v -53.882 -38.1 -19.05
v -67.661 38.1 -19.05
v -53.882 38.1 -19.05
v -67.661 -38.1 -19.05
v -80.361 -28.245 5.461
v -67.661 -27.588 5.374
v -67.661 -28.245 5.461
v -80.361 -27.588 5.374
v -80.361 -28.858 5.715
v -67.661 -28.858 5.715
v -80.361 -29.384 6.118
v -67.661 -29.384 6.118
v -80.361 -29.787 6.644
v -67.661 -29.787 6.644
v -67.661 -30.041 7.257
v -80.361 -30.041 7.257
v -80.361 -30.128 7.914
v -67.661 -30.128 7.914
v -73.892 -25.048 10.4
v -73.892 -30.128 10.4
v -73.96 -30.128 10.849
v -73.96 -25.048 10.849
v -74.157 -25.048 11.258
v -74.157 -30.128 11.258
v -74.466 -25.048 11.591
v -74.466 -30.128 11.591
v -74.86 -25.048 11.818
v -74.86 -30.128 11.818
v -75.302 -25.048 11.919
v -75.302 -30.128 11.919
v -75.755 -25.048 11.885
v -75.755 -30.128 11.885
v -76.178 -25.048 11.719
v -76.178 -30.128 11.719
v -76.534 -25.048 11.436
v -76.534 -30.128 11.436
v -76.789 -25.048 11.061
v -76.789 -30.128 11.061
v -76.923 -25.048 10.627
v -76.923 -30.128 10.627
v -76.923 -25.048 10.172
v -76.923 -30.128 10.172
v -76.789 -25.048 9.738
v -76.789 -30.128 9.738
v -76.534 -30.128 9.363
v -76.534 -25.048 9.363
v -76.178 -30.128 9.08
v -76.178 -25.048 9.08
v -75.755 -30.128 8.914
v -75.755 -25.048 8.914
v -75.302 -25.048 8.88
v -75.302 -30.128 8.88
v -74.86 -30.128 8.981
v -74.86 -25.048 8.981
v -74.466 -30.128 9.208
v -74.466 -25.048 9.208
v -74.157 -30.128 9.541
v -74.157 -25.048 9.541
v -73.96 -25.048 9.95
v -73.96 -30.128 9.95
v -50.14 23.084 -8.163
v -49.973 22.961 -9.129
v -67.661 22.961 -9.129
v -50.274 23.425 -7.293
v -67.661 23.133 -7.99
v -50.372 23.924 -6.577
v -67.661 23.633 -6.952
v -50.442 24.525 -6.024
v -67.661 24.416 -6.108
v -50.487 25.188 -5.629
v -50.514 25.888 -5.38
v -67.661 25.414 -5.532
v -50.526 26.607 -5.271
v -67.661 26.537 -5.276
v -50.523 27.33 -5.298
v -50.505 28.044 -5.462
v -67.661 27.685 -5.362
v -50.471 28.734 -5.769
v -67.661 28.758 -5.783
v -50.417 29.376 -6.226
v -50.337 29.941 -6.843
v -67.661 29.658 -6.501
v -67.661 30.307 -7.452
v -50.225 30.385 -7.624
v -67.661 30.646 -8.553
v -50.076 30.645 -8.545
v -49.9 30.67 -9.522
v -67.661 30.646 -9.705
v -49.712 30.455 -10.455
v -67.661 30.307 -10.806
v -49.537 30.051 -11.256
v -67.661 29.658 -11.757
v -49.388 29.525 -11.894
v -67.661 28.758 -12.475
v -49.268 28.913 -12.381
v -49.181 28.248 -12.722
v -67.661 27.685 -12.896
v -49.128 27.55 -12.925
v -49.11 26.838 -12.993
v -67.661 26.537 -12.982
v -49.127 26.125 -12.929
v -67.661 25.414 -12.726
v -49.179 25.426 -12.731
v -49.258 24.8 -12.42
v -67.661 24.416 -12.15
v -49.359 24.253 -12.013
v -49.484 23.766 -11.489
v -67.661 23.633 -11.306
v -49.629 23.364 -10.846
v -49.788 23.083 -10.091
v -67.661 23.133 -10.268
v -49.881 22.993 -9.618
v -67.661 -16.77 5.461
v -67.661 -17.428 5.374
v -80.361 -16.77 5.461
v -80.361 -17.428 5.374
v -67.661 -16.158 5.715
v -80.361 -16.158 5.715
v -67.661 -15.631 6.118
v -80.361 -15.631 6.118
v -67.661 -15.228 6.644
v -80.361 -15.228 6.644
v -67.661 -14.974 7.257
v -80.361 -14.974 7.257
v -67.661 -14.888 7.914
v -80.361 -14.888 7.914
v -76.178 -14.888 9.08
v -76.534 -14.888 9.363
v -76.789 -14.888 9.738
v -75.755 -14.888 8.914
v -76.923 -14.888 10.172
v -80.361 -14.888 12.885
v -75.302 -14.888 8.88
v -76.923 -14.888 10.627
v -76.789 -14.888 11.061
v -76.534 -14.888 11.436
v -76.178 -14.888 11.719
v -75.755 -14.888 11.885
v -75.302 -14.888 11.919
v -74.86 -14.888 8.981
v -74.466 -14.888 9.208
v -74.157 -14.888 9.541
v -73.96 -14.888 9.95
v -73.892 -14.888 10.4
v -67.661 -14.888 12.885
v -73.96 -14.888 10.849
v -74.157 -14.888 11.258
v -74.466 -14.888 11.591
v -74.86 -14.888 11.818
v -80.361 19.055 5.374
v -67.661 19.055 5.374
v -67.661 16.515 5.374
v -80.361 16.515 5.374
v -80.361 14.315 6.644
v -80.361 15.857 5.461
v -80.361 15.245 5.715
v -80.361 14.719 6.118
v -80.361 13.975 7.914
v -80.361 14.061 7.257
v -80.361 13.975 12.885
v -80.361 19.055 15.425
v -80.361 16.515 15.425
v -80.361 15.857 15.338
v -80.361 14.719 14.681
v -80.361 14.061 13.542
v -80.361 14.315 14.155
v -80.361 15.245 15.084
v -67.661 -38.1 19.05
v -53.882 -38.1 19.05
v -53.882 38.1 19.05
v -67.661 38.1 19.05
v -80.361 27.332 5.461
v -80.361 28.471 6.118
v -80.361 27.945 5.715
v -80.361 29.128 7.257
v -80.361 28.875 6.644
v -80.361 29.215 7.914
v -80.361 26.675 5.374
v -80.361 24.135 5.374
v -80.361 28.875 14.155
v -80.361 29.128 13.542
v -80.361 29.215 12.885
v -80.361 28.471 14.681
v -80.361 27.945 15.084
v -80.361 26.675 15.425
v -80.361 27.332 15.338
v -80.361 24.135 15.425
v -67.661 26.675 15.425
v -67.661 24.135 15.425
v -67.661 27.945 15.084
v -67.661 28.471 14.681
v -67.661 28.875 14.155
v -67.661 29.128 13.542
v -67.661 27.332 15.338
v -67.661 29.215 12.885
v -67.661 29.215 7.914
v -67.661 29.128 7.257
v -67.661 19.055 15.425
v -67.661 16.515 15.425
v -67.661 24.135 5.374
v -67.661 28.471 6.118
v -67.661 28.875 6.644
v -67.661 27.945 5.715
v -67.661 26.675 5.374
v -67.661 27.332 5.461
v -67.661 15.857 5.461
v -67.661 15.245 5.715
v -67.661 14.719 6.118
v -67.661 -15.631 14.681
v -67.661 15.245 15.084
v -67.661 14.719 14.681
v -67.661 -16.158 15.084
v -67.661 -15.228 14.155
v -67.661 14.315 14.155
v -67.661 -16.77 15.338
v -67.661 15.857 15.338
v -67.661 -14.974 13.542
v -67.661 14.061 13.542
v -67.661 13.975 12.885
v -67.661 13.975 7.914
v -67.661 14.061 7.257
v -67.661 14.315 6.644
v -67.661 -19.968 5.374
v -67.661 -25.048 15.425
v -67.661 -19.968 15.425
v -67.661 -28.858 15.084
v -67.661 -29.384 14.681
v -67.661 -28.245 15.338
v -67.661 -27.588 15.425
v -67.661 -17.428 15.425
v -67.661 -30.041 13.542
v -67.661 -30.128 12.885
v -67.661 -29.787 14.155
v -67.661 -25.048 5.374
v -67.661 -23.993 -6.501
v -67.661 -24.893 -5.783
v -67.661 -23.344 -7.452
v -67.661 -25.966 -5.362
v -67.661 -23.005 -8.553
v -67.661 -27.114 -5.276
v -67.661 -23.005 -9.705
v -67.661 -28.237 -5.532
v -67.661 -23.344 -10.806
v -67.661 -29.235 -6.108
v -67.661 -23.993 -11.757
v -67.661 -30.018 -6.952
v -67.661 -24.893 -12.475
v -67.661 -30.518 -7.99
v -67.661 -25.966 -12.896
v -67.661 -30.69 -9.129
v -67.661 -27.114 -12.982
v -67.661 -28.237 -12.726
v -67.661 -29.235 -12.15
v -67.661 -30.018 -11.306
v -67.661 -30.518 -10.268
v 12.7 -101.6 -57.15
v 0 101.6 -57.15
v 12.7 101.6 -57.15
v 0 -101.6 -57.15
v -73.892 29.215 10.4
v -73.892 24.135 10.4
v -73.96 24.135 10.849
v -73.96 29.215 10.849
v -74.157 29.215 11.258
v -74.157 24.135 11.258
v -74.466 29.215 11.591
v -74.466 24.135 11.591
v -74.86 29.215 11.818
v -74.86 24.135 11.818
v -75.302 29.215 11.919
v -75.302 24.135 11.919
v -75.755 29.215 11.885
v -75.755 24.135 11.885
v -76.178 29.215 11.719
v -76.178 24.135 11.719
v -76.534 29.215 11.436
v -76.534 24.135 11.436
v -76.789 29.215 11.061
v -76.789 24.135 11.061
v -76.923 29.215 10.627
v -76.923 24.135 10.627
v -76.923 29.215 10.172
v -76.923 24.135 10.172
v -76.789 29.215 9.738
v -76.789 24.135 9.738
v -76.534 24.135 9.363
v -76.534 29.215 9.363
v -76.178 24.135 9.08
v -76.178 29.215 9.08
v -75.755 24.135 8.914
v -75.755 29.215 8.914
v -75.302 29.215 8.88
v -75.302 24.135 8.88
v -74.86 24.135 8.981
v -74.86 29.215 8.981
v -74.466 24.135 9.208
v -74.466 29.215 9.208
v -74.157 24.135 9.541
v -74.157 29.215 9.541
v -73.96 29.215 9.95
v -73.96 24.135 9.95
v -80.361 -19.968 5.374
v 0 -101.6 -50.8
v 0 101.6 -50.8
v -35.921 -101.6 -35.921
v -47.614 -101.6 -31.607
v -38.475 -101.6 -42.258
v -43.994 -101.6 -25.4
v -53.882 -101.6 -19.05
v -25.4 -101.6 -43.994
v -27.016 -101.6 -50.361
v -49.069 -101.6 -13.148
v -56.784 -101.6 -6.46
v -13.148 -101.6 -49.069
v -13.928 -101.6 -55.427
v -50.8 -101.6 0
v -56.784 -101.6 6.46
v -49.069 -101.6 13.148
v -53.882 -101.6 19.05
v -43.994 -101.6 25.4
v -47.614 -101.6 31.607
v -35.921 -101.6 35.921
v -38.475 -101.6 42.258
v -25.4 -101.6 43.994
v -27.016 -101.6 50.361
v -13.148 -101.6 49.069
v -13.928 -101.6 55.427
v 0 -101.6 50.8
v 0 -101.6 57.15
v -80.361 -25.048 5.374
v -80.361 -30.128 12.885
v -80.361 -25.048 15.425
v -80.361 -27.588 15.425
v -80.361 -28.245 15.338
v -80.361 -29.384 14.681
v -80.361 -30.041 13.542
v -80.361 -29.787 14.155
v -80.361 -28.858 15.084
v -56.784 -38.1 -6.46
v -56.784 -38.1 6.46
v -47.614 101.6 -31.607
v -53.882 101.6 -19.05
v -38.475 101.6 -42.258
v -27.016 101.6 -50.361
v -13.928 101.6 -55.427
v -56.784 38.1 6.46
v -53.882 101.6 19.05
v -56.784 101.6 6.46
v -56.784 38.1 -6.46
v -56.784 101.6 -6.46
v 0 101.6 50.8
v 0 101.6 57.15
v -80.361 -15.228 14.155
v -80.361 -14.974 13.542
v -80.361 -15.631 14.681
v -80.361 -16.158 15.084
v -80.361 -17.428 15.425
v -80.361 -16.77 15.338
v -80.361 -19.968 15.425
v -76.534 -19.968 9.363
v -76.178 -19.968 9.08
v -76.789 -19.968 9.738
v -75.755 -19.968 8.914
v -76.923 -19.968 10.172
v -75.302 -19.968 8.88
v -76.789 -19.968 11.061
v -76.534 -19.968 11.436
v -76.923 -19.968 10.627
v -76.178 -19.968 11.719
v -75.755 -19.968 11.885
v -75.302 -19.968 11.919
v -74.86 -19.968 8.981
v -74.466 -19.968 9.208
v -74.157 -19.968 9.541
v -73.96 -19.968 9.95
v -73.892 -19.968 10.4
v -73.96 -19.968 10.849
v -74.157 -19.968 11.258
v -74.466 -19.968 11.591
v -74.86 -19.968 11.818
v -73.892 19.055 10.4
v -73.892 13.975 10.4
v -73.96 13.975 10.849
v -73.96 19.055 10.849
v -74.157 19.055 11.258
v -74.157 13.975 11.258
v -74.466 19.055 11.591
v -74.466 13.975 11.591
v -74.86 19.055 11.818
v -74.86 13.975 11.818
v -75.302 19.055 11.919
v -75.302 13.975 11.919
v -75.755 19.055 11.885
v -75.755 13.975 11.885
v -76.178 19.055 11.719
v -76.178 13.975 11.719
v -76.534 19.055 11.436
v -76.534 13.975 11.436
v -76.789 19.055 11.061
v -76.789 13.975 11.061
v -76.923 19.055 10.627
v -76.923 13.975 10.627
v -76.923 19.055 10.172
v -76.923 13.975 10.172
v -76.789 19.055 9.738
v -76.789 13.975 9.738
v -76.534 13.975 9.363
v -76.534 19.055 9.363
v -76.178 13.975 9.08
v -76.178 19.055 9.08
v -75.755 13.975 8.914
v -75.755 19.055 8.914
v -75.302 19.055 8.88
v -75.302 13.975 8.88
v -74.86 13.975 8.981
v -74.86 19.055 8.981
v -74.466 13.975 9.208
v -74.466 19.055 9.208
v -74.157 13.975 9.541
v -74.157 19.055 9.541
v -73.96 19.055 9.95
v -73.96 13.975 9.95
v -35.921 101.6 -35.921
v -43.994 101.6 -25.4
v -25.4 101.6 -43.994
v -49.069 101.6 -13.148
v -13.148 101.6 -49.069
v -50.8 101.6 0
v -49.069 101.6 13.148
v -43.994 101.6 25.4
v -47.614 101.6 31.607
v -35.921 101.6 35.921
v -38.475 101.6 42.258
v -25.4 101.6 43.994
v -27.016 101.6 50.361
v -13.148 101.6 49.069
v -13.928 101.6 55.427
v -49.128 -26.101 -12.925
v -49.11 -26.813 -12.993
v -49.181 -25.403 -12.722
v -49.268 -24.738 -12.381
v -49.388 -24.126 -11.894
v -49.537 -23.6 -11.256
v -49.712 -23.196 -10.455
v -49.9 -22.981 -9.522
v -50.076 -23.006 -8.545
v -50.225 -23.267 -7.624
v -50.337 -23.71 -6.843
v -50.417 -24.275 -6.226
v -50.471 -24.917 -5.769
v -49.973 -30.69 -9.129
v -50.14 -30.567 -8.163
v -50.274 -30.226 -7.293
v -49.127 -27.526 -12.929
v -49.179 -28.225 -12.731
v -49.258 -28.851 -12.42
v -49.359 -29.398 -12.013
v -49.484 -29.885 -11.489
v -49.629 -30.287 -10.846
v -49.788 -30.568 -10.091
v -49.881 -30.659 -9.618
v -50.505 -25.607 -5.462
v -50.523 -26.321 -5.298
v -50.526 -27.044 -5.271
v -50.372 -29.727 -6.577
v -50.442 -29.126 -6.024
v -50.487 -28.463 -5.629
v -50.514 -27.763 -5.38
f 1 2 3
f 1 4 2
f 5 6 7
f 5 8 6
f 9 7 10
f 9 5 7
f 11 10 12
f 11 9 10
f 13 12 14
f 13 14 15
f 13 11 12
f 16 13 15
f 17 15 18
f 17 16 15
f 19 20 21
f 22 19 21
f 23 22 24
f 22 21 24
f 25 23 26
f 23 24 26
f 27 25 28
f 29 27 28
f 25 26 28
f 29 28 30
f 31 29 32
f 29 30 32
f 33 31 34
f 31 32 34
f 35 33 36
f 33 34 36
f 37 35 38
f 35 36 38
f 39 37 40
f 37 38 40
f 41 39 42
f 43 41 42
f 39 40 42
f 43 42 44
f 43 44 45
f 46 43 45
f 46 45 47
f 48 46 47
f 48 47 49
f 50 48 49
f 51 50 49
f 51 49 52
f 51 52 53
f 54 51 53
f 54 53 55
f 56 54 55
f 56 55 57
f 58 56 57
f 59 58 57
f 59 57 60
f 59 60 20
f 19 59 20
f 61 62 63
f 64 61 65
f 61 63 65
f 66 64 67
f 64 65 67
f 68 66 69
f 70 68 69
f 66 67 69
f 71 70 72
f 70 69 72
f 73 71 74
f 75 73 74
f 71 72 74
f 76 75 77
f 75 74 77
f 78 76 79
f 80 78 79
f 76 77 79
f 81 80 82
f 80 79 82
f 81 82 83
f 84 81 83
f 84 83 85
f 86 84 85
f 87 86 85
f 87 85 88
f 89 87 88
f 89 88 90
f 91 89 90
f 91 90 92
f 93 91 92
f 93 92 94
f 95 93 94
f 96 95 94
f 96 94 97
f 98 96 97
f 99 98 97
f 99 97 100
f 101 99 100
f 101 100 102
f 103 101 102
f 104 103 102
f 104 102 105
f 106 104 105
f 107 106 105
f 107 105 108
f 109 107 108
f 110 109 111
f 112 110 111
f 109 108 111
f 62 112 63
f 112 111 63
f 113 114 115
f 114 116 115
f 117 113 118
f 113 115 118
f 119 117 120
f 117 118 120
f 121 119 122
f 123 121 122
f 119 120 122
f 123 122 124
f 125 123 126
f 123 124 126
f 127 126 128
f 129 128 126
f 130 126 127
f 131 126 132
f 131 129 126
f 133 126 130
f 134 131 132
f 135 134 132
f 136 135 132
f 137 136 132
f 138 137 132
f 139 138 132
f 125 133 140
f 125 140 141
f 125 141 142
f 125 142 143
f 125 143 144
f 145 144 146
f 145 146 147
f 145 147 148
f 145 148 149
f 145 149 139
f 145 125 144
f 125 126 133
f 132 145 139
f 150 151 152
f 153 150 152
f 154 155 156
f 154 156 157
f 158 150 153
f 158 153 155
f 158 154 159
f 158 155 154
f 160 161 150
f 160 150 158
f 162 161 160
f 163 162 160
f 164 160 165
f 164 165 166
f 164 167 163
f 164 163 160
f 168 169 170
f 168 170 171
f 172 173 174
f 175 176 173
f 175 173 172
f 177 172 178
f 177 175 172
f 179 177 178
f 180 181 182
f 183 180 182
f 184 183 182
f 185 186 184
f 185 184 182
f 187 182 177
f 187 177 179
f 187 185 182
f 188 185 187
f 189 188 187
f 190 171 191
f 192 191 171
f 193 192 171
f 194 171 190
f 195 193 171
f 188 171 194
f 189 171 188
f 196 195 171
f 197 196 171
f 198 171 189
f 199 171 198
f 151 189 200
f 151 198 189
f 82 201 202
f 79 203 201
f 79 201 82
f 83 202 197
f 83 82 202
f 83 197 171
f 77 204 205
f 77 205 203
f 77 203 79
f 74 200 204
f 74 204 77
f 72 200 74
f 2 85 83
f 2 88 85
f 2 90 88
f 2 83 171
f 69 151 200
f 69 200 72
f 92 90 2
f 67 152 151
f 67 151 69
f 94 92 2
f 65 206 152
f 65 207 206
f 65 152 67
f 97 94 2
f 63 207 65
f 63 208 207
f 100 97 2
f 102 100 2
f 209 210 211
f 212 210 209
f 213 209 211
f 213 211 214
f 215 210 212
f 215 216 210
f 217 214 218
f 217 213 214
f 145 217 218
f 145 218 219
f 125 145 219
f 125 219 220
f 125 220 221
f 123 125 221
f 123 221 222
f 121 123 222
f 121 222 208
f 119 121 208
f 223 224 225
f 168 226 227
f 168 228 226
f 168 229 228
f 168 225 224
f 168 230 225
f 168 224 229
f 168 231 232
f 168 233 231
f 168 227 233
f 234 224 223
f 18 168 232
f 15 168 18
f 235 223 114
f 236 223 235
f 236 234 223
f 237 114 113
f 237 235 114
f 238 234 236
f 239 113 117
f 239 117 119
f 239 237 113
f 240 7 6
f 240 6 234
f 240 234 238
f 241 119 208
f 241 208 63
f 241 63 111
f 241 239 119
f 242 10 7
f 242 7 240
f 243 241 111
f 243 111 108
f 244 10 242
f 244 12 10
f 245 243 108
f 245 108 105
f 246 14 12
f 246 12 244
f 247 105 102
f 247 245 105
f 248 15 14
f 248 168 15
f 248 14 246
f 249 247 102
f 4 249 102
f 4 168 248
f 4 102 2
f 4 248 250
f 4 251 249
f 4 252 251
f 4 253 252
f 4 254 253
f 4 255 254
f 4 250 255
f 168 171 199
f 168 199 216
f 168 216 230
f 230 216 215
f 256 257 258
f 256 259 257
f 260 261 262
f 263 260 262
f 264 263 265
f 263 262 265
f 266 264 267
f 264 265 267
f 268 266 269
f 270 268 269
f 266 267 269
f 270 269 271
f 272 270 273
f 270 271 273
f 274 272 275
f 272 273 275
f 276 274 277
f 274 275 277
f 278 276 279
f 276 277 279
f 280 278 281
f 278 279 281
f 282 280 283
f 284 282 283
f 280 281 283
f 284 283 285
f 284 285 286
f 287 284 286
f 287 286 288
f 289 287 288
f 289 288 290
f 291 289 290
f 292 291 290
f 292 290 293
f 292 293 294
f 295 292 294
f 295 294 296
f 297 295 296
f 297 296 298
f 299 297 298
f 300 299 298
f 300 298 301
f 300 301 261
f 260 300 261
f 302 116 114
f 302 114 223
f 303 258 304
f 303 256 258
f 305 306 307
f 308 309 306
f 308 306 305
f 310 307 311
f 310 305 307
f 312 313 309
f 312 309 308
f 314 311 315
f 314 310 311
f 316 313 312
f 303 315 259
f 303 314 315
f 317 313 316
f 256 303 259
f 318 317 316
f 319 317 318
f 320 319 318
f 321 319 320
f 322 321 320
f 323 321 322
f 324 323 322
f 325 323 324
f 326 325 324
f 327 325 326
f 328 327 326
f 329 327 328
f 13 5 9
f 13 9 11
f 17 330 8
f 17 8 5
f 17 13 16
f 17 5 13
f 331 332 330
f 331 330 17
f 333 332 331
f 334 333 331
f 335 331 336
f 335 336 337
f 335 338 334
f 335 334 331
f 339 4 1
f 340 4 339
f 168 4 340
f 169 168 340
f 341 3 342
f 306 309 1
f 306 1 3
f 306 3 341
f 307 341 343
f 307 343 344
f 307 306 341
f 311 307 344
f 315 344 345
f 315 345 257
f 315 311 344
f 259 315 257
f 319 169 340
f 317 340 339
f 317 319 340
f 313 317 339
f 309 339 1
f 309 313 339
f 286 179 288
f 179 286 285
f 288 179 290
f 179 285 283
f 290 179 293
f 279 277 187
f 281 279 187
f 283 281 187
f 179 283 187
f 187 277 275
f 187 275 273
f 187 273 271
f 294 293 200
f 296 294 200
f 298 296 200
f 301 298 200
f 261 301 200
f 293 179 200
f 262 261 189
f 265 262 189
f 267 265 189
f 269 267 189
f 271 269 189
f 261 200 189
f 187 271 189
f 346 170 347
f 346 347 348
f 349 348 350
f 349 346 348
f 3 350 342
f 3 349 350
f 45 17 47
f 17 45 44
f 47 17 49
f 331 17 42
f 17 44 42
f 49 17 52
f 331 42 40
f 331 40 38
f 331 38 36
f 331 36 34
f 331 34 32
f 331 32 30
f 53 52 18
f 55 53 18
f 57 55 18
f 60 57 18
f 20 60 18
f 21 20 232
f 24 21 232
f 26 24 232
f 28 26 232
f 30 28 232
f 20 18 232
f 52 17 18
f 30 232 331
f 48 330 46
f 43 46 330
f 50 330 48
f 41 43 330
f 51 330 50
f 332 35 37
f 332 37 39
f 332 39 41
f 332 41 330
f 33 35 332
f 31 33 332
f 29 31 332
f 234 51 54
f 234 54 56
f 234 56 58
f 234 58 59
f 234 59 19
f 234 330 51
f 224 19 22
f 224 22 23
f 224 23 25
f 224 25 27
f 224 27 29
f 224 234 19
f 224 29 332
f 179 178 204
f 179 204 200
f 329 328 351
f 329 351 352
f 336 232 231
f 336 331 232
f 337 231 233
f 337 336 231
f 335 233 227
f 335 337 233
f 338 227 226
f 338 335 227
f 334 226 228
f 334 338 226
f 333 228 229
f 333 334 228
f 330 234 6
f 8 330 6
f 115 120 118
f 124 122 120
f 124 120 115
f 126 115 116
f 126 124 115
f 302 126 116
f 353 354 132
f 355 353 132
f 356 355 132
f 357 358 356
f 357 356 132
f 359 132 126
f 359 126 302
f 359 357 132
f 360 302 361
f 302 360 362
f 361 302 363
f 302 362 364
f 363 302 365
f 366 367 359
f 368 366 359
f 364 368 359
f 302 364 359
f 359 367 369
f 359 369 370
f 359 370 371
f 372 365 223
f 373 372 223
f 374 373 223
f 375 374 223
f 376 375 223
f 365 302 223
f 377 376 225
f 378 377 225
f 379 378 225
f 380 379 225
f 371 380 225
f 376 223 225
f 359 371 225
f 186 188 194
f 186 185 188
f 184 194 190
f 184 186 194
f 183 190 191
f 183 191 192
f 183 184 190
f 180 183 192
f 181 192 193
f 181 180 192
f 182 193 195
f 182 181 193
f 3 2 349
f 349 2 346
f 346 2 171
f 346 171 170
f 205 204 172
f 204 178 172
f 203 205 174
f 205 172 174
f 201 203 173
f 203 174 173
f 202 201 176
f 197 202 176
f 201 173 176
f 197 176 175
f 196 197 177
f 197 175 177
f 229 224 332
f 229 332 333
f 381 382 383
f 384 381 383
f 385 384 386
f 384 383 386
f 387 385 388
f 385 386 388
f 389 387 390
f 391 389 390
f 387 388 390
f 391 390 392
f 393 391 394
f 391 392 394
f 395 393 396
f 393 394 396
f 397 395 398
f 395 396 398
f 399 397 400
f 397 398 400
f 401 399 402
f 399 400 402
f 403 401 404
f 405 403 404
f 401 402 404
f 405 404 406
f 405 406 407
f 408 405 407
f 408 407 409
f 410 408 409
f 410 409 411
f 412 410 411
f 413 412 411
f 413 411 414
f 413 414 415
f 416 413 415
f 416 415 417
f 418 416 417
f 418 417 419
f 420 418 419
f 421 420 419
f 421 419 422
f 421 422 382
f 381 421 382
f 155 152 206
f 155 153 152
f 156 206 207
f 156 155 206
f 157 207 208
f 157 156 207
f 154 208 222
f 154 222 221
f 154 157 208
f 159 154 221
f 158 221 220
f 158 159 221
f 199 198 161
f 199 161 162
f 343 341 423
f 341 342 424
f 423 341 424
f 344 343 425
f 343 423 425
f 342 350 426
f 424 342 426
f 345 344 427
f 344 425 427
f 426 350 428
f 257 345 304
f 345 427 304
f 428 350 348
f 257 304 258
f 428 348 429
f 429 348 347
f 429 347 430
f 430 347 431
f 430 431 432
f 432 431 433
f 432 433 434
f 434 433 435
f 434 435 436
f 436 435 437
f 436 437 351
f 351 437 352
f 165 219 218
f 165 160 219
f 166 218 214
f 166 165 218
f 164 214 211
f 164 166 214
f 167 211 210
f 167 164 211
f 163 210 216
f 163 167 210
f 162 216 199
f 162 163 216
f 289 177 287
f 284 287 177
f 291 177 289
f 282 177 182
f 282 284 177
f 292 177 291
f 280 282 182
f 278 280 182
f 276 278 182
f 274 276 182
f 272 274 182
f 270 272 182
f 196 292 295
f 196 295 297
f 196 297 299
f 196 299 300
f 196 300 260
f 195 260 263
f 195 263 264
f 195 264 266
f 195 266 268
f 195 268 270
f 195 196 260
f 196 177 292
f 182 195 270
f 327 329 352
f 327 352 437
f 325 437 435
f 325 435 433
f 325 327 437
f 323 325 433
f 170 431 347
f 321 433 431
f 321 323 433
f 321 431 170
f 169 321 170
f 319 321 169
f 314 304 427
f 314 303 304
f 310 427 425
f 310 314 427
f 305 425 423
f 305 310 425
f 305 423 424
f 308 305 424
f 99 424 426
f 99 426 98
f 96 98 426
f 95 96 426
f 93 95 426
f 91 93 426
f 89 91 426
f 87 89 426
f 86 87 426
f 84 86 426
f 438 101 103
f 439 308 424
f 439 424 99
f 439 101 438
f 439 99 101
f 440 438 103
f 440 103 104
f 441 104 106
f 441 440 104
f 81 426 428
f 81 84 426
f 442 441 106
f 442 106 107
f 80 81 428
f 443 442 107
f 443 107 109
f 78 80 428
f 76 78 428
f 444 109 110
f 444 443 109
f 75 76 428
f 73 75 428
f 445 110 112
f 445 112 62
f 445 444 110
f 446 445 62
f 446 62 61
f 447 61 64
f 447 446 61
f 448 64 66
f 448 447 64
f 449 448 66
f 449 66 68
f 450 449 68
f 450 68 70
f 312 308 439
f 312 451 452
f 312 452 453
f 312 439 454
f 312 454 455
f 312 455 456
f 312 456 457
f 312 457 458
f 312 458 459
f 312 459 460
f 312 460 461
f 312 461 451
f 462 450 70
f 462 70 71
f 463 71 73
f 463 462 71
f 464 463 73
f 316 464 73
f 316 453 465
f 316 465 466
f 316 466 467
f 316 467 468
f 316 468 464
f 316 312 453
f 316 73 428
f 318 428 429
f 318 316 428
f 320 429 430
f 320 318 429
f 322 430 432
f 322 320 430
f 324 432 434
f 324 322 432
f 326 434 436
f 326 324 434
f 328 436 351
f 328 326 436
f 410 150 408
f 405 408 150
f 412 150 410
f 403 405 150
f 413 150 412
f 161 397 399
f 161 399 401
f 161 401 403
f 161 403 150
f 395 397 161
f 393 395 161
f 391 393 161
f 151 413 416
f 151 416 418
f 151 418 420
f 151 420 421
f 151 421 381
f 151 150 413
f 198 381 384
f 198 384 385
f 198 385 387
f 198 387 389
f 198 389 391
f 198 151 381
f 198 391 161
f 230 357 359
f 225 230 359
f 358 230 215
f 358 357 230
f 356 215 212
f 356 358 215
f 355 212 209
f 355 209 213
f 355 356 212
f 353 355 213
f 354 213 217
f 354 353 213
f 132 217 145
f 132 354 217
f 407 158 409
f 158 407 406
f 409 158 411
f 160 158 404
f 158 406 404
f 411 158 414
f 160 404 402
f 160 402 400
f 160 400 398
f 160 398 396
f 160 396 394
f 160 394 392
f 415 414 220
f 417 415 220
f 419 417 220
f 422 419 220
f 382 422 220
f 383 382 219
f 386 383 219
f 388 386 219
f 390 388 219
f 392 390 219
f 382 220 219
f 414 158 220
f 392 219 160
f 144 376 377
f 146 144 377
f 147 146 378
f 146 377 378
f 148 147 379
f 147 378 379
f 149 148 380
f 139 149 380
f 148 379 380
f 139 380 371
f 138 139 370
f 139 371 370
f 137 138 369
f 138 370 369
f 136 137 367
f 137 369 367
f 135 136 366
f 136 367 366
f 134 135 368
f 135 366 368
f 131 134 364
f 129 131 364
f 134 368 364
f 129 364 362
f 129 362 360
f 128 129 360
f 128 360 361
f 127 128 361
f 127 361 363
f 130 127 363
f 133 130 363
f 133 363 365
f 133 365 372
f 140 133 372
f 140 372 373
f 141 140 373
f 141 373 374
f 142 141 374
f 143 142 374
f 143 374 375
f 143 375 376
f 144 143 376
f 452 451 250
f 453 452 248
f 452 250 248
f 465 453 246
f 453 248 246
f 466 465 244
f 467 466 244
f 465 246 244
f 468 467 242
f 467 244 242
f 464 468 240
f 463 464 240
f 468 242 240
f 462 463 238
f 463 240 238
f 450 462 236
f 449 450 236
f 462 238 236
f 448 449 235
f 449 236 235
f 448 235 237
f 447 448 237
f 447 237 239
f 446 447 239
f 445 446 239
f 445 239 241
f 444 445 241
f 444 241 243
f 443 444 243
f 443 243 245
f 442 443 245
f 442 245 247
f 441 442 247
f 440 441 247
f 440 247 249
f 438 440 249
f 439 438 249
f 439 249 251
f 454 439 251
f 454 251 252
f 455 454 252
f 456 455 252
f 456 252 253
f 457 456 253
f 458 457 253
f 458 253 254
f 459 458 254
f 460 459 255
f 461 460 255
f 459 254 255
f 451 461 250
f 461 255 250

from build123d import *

# Parameters (mm, degrees)
F1_DEPTH = 101.6
F2_DEPTH = 38.1
F3_R     = 3.86409
F4_DEPTH = 25.4
F3_W     = 5.08
F3_H     = 10.050485
F5_DEPTH = 12.7
F6_R     = 2.54
F7_R     = 1.524
F8_DEPTH = 101.6


with BuildPart() as f1:
    # F0 (on Front) → F1 (new body, symmetric)
    with BuildSketch(Plane.XZ):
        with BuildLine():
            ThreePointArc((0, -50.8), (-50.8, 0), (0, 50.8))
            Line((0, 50.8), (0, 57.15))
            ThreePointArc((0, 57.15), (-32.995568, 46.66278), (-53.881537, 19.05))
            ThreePointArc((-53.881537, 19.05), (-57.15, 0), (-53.881537, -19.05))
            ThreePointArc((-53.881537, -19.05), (-32.995568, -46.66278), (0, -57.15))
            Line((0, -57.15), (12.7, -57.15))
            Line((12.7, -57.15), (0, -50.8))
        make_face()
    extrude(amount=F1_DEPTH, both=True)

    # F0 (on Front) → F2 (join, symmetric)
    with BuildSketch(Plane.XZ):
        with BuildLine():
            ThreePointArc((-53.881537, -19.05), (-57.15, 0), (-53.881537, 19.05))
            Line((-53.881537, 19.05), (-67.661227, 19.05))
            Line((-67.661227, 19.05), (-67.661227, -19.05))
            Line((-67.661227, -19.05), (-53.881537, -19.05))
        make_face()
    extrude(amount=F2_DEPTH, both=True)

    # F3 (on face) → F4 (cut)
    with BuildSketch(Plane(origin=(-67.661227, 0, 0), x_dir=(0, -1, 0), z_dir=(-1, 0, 0))):
        with Locations((-26.825511, -9.129036)):
            Circle(F3_R)
        with Locations((26.825511, -9.129036)):
            Circle(F3_R)
    extrude(amount=-F4_DEPTH, mode=Mode.SUBTRACT)

    # F3 (on face) → F5 (join)
    with BuildSketch(Plane(origin=(-67.661227, 0, 0), x_dir=(0, -1, 0), z_dir=(-1, 0, 0))):
        with Locations((-26.67489, 10.3995)):
            Rectangle(F3_W, F3_H)
        with Locations((-16.51489, 10.3995)):
            Rectangle(F3_W, F3_H)
        with Locations((17.42751, 10.3995)):
            Rectangle(F3_W, F3_H)
        with Locations((27.58751, 10.3995)):
            Rectangle(F3_W, F3_H)
    extrude(amount=F5_DEPTH)

    # F6
    f6_edges = [f1.edges().sort_by_distance(p)[0] for p in [
        (-74.011227, 29.21489, 15.424743),
        (-74.011227, 29.21489, 5.374258),
        (-74.011227, 13.97489, 5.374258),
        (-74.011227, 13.97489, 15.424743),
        (-74.011227, -14.88751, 5.374258),
        (-74.011227, -30.12751, 5.374258),
        (-74.011227, -30.12751, 15.424743),
        (-74.011227, -14.88751, 15.424743),
    ]]
    fillet(f6_edges, radius=F6_R)

    # F7 (on face) → F8 (cut)
    with BuildSketch(Plane.XZ.offset(30.12751)):
        with Locations((-75.416334, 10.399501)):
            Circle(F7_R)
    extrude(amount=-F8_DEPTH, mode=Mode.SUBTRACT)


solid = f1.part
